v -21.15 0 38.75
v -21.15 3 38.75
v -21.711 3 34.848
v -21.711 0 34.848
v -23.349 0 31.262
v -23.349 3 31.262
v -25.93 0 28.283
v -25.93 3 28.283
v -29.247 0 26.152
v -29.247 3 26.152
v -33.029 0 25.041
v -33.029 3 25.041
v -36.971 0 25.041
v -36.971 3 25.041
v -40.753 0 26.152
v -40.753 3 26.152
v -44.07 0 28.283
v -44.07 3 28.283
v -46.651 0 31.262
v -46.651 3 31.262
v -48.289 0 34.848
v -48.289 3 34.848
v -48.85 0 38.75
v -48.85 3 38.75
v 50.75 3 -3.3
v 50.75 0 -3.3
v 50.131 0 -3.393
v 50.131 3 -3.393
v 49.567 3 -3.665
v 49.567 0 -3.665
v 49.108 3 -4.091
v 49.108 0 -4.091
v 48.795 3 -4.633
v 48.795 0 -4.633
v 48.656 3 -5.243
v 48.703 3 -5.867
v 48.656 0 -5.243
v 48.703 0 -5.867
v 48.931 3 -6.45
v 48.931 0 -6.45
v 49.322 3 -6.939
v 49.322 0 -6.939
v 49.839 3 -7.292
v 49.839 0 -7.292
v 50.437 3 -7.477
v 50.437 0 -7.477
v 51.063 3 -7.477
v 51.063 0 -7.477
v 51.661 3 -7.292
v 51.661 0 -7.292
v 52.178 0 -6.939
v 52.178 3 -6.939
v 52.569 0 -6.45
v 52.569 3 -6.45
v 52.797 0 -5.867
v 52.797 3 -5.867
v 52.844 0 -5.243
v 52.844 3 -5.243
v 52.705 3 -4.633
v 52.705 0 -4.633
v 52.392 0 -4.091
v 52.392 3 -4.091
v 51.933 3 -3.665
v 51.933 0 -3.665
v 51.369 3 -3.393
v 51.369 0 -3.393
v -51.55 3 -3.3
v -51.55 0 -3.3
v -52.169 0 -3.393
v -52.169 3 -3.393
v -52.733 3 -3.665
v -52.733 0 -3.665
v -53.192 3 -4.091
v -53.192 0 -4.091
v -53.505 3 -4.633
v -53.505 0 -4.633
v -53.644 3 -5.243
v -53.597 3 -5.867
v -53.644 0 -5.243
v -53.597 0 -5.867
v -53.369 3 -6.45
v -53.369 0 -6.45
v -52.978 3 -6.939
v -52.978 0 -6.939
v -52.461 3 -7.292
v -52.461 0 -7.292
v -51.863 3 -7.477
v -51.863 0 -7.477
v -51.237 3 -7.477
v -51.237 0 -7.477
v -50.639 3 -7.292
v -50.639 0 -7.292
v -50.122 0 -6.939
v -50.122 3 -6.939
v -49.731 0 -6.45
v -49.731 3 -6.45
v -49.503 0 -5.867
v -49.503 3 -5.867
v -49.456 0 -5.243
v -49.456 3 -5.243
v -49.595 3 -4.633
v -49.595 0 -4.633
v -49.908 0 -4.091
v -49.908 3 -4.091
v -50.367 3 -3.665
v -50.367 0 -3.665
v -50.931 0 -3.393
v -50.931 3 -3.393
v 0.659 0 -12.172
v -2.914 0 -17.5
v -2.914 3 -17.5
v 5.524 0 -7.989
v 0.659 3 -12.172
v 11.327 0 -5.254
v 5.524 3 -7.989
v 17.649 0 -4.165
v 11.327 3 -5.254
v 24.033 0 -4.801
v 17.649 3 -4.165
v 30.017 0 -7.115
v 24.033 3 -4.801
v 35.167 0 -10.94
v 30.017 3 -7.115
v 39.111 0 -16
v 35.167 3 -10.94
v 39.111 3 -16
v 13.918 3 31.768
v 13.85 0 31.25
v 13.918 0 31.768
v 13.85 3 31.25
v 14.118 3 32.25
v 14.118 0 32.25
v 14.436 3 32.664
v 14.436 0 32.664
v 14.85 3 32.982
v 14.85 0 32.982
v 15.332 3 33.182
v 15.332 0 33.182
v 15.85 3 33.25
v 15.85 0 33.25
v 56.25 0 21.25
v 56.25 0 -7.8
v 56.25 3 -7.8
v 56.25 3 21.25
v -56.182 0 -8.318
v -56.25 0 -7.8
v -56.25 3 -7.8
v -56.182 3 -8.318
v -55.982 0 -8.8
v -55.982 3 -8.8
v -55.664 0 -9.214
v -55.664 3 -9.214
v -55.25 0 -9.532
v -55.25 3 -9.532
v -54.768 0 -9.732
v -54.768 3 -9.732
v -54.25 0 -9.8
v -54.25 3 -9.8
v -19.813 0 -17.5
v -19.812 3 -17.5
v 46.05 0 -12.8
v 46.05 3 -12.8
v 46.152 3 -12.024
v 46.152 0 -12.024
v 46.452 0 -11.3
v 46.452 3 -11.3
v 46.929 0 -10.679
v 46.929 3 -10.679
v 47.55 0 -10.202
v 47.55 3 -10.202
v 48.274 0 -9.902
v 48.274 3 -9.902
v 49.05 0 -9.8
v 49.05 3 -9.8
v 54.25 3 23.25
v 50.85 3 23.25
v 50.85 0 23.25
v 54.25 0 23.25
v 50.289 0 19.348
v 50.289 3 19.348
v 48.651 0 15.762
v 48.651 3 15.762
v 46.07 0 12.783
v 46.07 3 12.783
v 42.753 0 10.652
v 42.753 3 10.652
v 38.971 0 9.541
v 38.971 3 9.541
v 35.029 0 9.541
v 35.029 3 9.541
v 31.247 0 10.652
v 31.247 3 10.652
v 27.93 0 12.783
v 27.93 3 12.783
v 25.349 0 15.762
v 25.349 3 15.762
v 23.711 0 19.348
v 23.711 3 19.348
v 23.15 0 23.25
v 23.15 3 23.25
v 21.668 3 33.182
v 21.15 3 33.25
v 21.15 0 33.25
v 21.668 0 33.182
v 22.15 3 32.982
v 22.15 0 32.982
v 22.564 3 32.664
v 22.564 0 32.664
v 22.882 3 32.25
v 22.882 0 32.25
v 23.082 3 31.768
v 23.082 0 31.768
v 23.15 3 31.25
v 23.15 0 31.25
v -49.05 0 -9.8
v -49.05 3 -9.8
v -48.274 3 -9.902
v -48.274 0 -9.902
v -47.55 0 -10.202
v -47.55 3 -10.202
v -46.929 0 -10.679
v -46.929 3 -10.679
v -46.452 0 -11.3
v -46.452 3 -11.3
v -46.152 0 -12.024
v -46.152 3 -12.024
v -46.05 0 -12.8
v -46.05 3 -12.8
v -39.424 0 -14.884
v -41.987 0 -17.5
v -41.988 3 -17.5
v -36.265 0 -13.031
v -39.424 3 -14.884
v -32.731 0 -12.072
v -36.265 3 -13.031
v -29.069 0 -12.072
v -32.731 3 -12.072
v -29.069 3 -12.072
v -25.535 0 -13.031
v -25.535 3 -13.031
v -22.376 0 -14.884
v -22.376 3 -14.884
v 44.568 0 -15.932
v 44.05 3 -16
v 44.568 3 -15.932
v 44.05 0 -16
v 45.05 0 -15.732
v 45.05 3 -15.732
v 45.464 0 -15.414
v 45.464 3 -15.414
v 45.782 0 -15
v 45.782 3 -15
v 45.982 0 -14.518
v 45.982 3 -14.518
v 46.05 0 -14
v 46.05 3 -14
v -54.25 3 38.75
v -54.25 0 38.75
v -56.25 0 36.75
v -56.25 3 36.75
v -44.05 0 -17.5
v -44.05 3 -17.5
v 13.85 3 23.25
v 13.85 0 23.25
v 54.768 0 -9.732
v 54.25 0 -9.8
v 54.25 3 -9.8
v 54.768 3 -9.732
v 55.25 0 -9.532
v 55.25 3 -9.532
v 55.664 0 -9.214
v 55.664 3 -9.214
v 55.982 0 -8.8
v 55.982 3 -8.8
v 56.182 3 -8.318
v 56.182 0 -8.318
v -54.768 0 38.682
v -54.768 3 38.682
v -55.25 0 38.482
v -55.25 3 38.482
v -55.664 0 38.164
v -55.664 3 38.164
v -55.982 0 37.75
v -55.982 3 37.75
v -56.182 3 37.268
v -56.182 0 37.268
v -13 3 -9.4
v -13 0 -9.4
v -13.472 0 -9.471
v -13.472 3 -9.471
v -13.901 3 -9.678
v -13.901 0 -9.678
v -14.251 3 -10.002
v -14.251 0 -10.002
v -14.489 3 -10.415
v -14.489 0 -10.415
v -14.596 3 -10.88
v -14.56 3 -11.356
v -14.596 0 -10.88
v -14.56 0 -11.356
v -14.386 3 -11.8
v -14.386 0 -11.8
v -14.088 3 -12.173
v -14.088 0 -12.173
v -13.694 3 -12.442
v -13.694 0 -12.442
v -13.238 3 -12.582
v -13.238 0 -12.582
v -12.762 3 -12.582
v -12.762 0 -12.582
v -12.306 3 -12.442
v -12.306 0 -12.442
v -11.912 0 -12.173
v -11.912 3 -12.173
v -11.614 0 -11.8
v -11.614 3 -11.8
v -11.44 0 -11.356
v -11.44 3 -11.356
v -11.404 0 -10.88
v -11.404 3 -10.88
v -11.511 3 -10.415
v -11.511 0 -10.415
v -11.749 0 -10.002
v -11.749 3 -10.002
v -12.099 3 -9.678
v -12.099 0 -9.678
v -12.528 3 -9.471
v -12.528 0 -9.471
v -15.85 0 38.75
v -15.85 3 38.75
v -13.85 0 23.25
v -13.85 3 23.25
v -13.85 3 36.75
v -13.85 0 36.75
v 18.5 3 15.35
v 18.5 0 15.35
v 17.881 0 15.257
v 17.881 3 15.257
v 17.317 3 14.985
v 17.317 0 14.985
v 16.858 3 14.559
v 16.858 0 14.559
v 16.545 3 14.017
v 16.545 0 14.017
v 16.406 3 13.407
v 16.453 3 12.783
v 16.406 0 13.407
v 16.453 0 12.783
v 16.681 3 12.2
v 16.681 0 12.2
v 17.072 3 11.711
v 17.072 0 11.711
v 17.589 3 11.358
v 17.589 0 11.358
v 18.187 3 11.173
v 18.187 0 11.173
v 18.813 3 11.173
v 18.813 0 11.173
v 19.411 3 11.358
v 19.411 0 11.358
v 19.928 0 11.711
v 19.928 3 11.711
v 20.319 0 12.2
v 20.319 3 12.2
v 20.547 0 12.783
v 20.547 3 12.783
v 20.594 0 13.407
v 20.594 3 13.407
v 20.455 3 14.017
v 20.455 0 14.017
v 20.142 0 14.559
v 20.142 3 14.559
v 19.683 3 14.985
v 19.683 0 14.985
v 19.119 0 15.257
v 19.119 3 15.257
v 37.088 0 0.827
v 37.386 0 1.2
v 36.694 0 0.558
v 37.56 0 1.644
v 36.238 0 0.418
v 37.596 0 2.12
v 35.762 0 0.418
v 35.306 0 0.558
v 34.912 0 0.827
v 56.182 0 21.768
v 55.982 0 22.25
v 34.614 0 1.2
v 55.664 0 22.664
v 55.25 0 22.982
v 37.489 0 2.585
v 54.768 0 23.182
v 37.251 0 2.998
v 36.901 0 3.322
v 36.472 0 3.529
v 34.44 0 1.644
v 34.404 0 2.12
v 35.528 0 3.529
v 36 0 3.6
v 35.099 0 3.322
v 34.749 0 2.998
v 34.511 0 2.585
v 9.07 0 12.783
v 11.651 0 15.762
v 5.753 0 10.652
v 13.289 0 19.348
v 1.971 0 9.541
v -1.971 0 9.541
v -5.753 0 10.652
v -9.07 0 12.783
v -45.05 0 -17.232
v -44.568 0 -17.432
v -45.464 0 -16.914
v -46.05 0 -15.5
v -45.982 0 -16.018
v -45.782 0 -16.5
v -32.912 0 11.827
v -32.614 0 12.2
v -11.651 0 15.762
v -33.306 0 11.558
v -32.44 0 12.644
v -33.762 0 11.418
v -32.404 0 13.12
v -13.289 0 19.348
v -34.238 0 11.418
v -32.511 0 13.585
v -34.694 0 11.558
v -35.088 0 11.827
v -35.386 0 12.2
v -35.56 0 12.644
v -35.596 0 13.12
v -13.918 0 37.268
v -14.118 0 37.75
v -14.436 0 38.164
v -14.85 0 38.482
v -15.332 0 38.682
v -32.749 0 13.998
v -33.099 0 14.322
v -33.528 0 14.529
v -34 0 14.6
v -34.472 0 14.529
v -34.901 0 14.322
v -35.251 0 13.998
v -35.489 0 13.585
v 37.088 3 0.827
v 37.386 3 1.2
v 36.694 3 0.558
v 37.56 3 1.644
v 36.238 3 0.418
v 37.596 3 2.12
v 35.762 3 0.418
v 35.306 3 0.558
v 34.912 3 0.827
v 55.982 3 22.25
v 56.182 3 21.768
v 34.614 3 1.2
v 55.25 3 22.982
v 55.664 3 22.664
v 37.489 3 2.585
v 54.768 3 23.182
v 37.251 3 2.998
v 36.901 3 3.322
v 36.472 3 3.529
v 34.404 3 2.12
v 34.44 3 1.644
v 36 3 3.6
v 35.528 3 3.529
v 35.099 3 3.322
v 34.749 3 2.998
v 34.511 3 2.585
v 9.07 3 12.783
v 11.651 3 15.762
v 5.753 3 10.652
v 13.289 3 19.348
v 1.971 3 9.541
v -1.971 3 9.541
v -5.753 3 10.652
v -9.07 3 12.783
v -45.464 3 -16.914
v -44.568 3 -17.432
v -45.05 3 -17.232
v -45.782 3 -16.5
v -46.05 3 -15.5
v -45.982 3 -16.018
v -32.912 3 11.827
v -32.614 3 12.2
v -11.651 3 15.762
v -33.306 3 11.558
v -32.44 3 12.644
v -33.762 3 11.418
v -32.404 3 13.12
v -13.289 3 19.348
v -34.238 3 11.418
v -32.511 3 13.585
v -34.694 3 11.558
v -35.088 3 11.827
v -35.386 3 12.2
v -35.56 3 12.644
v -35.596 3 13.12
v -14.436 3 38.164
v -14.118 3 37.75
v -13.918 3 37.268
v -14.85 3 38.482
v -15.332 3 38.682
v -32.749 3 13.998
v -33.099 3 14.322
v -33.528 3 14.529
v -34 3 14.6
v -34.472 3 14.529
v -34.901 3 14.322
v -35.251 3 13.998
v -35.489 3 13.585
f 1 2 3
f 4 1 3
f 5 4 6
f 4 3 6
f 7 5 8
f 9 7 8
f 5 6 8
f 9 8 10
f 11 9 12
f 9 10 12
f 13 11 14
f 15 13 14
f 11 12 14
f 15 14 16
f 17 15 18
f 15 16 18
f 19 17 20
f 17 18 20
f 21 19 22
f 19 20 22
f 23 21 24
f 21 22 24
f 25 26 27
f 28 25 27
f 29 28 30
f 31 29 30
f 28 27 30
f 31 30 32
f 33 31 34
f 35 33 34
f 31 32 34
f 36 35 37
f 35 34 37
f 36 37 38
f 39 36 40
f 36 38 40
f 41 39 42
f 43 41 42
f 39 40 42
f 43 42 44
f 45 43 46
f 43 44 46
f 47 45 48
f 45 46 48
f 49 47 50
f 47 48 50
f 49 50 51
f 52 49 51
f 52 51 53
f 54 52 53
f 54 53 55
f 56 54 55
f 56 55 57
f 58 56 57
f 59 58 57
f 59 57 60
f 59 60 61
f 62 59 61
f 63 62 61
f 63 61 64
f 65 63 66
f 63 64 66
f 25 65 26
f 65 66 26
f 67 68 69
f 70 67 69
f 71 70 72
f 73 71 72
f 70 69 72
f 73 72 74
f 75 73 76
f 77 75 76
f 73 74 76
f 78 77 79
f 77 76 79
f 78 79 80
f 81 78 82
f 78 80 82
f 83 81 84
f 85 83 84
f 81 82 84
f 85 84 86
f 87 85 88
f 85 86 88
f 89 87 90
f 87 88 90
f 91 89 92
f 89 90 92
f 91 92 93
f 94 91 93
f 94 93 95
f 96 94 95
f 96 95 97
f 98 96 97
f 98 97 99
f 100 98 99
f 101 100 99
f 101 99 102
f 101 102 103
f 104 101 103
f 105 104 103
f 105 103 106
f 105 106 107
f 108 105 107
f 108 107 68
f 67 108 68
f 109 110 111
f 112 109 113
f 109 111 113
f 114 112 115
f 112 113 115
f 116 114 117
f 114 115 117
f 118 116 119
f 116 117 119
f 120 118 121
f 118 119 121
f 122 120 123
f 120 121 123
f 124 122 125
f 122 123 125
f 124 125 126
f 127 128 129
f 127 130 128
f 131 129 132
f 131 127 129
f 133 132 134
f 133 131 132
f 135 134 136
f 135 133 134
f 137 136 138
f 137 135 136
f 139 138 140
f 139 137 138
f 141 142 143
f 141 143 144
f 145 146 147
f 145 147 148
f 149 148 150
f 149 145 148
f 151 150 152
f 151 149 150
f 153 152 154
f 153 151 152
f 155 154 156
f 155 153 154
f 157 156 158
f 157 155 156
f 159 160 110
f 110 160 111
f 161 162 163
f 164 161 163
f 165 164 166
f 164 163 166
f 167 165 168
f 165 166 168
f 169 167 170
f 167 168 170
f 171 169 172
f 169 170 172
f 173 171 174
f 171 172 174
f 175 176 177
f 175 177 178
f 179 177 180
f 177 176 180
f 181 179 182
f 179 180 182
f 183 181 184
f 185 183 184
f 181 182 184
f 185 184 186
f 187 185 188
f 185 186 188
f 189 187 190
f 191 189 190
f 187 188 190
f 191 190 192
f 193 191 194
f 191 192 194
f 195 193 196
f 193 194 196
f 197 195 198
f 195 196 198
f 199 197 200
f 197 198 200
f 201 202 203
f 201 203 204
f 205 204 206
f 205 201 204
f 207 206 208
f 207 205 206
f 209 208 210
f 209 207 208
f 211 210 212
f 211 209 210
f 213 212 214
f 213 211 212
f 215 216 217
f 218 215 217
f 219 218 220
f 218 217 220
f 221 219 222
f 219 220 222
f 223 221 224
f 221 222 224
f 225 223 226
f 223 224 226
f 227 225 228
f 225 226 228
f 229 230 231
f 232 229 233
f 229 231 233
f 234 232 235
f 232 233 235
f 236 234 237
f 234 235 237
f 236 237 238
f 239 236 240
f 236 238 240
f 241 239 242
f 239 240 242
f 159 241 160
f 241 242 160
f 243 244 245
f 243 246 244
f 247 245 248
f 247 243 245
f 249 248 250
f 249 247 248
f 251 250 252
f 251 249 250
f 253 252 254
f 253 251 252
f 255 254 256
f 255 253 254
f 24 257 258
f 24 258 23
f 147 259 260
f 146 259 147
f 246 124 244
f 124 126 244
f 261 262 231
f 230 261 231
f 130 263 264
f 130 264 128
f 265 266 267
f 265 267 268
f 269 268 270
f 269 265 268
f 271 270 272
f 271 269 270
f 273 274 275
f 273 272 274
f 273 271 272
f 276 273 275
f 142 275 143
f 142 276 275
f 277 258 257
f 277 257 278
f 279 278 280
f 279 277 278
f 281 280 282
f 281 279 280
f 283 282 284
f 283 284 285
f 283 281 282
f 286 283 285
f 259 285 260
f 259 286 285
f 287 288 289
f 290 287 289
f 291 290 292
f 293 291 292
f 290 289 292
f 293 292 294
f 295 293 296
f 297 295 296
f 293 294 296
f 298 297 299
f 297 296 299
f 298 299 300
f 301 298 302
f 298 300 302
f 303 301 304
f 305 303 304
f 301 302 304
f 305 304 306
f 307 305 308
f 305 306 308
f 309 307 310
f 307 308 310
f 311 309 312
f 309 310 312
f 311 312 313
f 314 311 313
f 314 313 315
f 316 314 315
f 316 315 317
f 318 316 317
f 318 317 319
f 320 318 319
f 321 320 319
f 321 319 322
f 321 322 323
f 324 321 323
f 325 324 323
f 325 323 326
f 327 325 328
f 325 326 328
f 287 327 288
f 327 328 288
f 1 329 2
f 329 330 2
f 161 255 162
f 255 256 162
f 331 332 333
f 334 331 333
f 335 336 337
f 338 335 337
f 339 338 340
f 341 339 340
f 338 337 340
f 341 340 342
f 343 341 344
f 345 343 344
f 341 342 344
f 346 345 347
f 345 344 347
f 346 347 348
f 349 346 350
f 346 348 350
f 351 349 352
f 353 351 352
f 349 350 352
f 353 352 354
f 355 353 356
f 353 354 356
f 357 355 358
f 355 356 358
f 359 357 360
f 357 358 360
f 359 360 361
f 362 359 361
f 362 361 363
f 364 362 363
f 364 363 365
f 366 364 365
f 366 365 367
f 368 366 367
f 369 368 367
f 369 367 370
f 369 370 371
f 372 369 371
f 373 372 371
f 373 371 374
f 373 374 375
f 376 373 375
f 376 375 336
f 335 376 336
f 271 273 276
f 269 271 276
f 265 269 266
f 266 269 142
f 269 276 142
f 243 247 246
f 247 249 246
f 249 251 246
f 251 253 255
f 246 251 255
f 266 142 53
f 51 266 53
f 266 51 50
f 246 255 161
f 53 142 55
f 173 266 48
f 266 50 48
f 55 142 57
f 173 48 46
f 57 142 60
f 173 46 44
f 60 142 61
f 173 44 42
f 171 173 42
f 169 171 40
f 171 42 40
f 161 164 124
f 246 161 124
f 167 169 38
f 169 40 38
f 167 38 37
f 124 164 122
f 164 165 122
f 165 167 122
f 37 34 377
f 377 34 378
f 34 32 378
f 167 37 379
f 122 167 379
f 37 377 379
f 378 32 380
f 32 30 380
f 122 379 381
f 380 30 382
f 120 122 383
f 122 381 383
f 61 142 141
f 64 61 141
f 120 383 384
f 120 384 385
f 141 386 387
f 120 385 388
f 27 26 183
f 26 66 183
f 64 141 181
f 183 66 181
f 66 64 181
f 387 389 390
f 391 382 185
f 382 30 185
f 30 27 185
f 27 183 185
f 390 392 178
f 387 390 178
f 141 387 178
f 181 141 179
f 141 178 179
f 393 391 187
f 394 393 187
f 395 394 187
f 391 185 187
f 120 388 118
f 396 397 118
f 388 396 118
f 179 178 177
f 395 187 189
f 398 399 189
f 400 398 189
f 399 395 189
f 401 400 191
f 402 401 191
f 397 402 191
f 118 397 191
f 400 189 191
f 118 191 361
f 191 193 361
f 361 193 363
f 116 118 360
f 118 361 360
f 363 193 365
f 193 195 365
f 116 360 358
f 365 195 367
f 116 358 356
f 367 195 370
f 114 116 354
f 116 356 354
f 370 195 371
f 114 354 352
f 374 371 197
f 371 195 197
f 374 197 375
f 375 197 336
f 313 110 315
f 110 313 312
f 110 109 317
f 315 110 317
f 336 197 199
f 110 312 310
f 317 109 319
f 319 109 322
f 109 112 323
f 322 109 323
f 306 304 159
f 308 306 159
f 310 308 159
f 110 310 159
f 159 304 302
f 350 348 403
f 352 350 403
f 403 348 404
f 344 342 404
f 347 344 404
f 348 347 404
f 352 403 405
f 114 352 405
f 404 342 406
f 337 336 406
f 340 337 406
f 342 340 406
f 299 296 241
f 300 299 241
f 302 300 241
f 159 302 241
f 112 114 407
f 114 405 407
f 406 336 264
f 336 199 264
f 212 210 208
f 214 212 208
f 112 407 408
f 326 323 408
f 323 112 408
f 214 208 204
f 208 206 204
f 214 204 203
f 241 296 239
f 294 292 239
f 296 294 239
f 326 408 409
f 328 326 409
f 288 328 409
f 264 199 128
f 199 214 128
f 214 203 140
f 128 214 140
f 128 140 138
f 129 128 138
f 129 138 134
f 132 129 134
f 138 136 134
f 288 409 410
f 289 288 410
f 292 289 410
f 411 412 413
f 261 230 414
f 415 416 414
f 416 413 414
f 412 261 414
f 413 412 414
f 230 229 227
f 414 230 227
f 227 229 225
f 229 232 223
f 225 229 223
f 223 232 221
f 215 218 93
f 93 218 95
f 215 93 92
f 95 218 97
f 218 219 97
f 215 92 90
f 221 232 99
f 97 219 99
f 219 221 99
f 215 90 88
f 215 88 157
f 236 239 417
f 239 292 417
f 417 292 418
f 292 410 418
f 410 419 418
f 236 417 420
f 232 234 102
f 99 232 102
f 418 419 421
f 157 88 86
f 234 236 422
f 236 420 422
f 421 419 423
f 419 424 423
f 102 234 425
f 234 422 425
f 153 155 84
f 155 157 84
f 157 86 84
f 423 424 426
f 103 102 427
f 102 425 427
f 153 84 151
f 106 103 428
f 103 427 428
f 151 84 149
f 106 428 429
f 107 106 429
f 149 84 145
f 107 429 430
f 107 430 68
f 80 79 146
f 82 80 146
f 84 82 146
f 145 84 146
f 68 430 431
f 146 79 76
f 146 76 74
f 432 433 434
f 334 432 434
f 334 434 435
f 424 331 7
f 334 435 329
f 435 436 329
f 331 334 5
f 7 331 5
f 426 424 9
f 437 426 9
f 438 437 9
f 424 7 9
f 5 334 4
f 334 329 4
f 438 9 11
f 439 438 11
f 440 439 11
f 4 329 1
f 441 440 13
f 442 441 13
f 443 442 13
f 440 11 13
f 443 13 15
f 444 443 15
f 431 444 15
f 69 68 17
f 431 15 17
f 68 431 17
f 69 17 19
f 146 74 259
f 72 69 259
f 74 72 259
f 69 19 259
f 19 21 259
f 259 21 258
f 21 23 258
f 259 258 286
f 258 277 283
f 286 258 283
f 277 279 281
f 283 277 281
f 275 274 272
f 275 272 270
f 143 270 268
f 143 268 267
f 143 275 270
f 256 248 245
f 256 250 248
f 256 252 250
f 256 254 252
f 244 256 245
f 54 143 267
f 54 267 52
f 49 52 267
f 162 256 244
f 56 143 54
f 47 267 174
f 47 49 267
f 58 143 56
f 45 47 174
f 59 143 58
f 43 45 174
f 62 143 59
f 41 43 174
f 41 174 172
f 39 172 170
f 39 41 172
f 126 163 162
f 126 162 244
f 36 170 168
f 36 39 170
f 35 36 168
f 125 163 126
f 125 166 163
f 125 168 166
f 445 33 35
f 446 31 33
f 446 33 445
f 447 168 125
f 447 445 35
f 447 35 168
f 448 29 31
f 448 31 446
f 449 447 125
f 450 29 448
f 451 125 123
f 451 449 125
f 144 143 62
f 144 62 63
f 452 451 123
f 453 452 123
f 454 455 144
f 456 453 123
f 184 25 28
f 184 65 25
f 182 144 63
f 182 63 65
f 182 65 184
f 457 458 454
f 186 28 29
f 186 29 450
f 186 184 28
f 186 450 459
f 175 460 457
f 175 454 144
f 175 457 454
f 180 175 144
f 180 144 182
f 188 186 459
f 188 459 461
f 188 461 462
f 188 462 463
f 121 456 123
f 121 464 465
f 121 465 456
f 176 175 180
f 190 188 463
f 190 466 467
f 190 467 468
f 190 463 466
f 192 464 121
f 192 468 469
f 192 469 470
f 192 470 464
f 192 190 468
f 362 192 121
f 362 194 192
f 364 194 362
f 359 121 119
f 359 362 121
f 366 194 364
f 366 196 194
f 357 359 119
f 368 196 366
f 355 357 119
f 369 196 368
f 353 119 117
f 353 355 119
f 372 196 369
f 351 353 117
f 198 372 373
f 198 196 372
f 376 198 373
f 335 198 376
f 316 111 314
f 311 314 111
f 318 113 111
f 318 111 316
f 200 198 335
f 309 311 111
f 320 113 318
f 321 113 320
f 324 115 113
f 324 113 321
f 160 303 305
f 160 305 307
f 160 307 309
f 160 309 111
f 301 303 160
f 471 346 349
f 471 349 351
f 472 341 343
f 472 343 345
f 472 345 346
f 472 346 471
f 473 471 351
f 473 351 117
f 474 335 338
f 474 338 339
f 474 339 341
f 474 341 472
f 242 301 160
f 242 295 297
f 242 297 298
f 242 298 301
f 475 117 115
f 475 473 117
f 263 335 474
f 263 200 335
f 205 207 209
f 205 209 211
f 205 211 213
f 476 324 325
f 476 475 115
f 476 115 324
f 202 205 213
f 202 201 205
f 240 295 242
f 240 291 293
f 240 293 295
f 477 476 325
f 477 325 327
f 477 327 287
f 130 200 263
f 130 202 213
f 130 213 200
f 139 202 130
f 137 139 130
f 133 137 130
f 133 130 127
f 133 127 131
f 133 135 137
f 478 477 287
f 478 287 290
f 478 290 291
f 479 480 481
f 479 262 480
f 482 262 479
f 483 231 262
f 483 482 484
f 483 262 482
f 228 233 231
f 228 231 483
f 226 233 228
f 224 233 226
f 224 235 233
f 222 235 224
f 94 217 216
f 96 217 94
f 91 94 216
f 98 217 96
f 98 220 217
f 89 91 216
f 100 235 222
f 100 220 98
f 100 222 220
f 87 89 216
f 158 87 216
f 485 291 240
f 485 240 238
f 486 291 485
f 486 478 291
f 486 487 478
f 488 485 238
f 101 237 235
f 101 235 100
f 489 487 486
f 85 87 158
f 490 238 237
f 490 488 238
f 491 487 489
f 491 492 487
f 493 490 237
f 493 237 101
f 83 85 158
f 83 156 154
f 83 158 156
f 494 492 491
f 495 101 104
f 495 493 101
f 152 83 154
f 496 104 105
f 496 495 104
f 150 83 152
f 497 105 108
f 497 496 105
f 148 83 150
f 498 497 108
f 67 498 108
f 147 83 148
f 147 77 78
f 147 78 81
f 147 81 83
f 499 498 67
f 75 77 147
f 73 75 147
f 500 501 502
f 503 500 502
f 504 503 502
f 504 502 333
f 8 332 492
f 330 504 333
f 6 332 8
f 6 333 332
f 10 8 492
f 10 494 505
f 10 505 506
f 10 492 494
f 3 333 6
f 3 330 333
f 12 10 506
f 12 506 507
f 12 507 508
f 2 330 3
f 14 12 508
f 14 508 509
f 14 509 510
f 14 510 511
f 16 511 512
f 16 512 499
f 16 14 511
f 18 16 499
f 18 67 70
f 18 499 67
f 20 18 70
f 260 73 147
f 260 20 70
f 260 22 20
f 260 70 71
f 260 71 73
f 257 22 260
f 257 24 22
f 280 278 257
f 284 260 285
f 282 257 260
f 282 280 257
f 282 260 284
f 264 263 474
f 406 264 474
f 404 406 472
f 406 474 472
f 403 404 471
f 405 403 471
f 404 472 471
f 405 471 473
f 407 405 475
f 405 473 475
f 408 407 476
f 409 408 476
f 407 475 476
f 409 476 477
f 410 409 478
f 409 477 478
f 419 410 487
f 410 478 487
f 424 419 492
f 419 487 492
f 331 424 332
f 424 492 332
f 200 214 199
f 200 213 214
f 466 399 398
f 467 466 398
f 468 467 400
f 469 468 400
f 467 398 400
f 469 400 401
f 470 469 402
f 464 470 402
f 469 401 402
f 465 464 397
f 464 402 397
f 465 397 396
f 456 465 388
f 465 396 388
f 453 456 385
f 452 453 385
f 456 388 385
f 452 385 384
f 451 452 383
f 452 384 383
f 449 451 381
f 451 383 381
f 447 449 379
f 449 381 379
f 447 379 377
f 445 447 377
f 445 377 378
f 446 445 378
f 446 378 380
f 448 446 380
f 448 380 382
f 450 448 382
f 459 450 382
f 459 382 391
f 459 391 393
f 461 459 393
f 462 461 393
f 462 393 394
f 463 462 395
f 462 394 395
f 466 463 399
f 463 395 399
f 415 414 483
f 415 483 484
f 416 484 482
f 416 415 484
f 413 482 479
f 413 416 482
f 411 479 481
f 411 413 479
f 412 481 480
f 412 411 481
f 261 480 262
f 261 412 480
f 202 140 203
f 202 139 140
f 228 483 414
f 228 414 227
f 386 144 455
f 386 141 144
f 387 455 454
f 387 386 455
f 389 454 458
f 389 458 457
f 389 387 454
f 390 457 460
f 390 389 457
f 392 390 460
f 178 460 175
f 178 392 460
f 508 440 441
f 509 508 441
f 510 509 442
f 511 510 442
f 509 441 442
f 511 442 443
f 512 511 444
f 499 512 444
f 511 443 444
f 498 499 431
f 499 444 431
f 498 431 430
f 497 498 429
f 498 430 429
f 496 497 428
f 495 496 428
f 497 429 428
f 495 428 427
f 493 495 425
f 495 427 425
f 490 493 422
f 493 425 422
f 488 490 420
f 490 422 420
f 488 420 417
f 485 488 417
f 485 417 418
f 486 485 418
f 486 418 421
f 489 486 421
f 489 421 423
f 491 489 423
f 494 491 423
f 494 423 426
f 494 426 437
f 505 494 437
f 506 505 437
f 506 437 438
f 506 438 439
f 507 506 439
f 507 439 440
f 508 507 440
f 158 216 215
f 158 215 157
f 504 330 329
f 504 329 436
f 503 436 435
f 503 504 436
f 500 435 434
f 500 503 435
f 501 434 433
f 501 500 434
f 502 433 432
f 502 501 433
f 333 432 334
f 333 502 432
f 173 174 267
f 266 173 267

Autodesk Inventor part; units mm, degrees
ref_plane "YZ Plane" through (0, 0, 0) normal (1, 0, 0) x (0, 1, 0)
ref_plane "XZ Plane" through (0, 0, 0) normal (0, 1, 0) x (-1, 0, 0)
ref_plane "XY Plane" through (0, 0, 0) normal (0, 0, 1) x (1, 0, 0)
sketch "Sketch1" plane through (0, 0, 0) normal (0, 1, 0) x (-1, 0, 0)
  line L0 (-56.25, 58.25) -> (56.25, 58.25)
  line L1 (56.25, 58.25) -> (56.25, -58.25)
  line L2 (56.25, -58.25) -> (-56.25, -58.25)
  line L3 (-56.25, -58.25) -> (-56.25, 58.25)
  line L4 (-56.25, 58.25) -> (56.25, -58.25) construction
  line L5 (56.25, 58.25) -> (-56.25, -58.25) construction
  point P0 (0, 0)
  dimension "d0" = 112.5
  dimension "d1" = 116.5
extrude "Extrusion1" add sketch "Sketch1" along normal blind 3
sketch "Sketch2" plane through (0, 3, 0) normal (0, 1, 0) x (1, 0, 0)
  circle A0 centre (18.5, 28) radius 23.85
  circle A1 centre (37, -23.25) radius 13.85
  circle A2 centre (-35, -38.75) radius 13.85
  circle A3 centre (-30.9, 25.8) radius 13.85
  circle A4 centre (0, -23.25) radius 13.85
  line L0 (56.25, 58.25) -> (-56.25, 58.25) projected
  line L1 (-56.25, -58.25) -> (56.25, -58.25) projected
  line L2 (0, -105.9299) -> (0, 123.2086) construction
  line L3 (-76.4777, -38.75) -> (-5.35, -38.75) construction
  line L4 (-123.5447, -23.25) -> (82.5572, -23.25) construction
  line L5 (56.25, -58.25) -> (56.25, 58.25) construction
  point P0 (0, 0)
  dimension "d4" = 47.7
  dimension "d5" = 27.7
  dimension "d6" = 27.7
  dimension "d7" = 27.7
  dimension "d8" = 27.7
  dimension "d9" = 116.5
  dimension "d10" = 112.5
  dimension "d13" = 37
  dimension "d14" = 18.5
  dimension "d15" = 30.9
  dimension "d18" = 19.5
  dimension "d19" = 35
  dimension "d20" = 35
  dimension "d57" = 25.8
  dimension "d58" = 28
  dimension "d59" = 23.25
extrude "Extrusion2" cut sketch "Sketch2" against normal blind 5
sketch "Sketch3" plane through (0, 3, 0) normal (0, 1, 0) x (1, 0, 0)
  line L0 (-56.25, 58.25) -> (-56.25, -58.25)
  line L1 (56.25, -58.25) -> (56.25, 58.25)
  line L2 (18.5, -17.4904) -> (18.5, -40.0394) construction
  line L3 (-51.55, 5.4) -> (-51.55, 71.9941) construction
  line L4 (50.75, 5.4) -> (50.75, 69.4565) construction
  line L5 (-73.722, 50) -> (66.5467, 50) construction
  line L6 (66.5467, 30) -> (-76.0779, 30) construction
  circle A0 centre (18.5, 28) radius 23.85 projected
  circle A1 centre (37, -23.25) radius 13.85 projected
  circle A2 centre (-30.9, 25.8) radius 13.85 projected
  circle A3 centre (0, -23.25) radius 13.85 projected
  circle A4 centre (-35, -38.75) radius 13.85 projected
  line L7 (56.25, 58.25) -> (-56.25, 58.25) projected
  line L8 (-56.25, 58.25) -> (-56.25, -58.25) projected
  line L9 (-56.25, -58.25) -> (56.25, -58.25) projected
  line L10 (56.25, -58.25) -> (56.25, 58.25) projected
  circle A5 centre (-30.9, 25.8) radius 13.85
  circle A6 centre (18.5, 28) radius 23.85
  circle A7 centre (0, -23.25) radius 13.85
  circle A8 centre (37, -23.25) radius 13.85
  circle A9 centre (-35, -38.75) radius 13.85
  line L11 (-56.25, 58.25) -> (-56.25, -58.25) projected
  line L12 (-56.25, 58.25) -> (-56.25, -58.25)
  line L13 (56.25, -58.25) -> (56.25, 58.25) projected
  line L14 (56.25, 58.25) -> (56.25, -58.25)
  line L15 (-56.25, 17.5) -> (-41.9875, 17.5)
  line L16 (-19.8125, 17.5) -> (-2.9143, 17.5)
  line L17 (39.1112, 16) -> (56.25, 16)
  line L18 (-56.25, -38.75) -> (-48.85, -38.75)
  circle A10 centre (-35, -38.75) radius 13.85 projected
  circle A11 centre (37, -23.25) radius 13.85 projected
  line L19 (50.85, -23.25) -> (56.25, -23.25)
  circle A12 centre (0, -23.25) radius 13.85 projected
  line L20 (-13.85, -23.25) -> (-13.85, -36.75)
  line L21 (-15.85, -38.75) -> (-21.15, -38.75)
  line L22 (13.85, -23.25) -> (13.85, -31.25)
  line L23 (15.85, -33.25) -> (21.15, -33.25)
  line L24 (23.15, -31.25) -> (23.15, -23.25)
  arc A13 (13.85, -31.25) -> (15.85, -33.25) centre (15.85, -31.25) ccw
  arc A14 (21.15, -33.25) -> (23.15, -31.25) centre (21.15, -31.25) ccw
  arc A15 (-15.85, -38.75) -> (-13.85, -36.75) centre (-15.85, -36.75) ccw
  point P0 (0, 0)
  point P1 (0, 0)
  point P2 (18.5, -13.25)
  point P3 (18.5, -23.25)
  point P4 (-51.55, 50)
  point P5 (-51.55, 30)
  point P6 (50.75, 50)
  point P7 (50.75, 30)
  point P8 (-13.85, -38.75)
  point P9 (13.85, -33.25)
  point P10 (-2.9143, 17.5)
  point P11 (-56.25, -38.75)
  dimension "d21" = 4.7
  dimension "d22" = 5.5
  dimension "d23" = 13.25
  dimension "d24" = 30
  dimension "d25" = 50
  dimension "d26" = 5.4
  dimension "d27" = 5.4
  dimension "d29" = 18.5
  dimension "d31" = 10
  dimension "d32" = 2
  dimension "d55" = 27.7
  dimension "d56" = 47.7
  dimension "d60" = 2
  dimension "d61" = 27.7
  dimension "d62" = 23.25
  dimension "d63" = 37
  dimension "d64" = 17.5
  dimension "d65" = 17.5
  dimension "d66" = 16
hole "Hole1" at (-51.55, 3, -5.4) at (50.75, 3, -5.4) at (18.5, 3, 13.25) at (-51.55, 3, -50) at (-51.55, 3, -30) at (50.75, 3, -50) at (50.75, 3, -30) direction (0, -1, 0) diameter 4.2 end through all
extrude "Extrusion3" cut sketch "Sketch3" against normal blind 10 contours L7 L1 L17 A0 L16 A2 L15 L0 | L18 A4 L21 A15 L20 A3 L22 A13 L23 A14 L24 A1 L19 L1 L9 L0 | A3
sketch "Sketch4" plane through (0, 3, 0) normal (0, 1, 0) x (1, 0, 0)
  line L0 (-50.25, 75.9498) -> (-50.25, -88.0061) construction
  line L1 (-63.9145, -52.25) -> (79.4097, -52.25) construction
  line L2 (50.25, 66.2924) -> (50.25, -77.9097) construction
  line L3 (-56.25, 58.25) -> (-56.25, -58.25) construction
  line L4 (-56.25, -58.25) -> (56.25, -58.25) construction
  line L5 (56.25, -58.25) -> (56.25, 58.25) construction
  line L6 (-71.816, 40) -> (84.2384, 40) construction
  line L7 (-70.7185, 14) -> (79.4097, 14) construction
  line L8 (-56.25, 17.5) -> (-56.25, -38.75) projected
  line L9 (-56.25, 17.5) -> (-46.05, 17.5)
  line L10 (-46.05, 17.5) -> (-46.05, 12.8)
  line L11 (-49.05, 9.8) -> (-56.25, 9.8)
  line L12 (-56.25, 9.8) -> (-56.25, 17.5)
  line L13 (56.25, -23.25) -> (56.25, 16) projected
  line L14 (56.25, 16) -> (46.05, 16)
  line L15 (46.05, 16) -> (46.05, 12.8)
  line L16 (49.05, 9.8) -> (56.25, 9.8)
  line L17 (56.25, 9.8) -> (56.25, 16)
  line L18 (56.25, -23.25) -> (56.25, 16) projected
  line L19 (-56.25, 17.5) -> (-56.25, -38.75) projected
  arc A0 (-49.05, 9.8) -> (-46.05, 12.8) centre (-49.05, 12.8) ccw
  arc A1 (46.05, 12.8) -> (49.05, 9.8) centre (49.05, 12.8) ccw
  point P0 (0, 0)
  point P1 (0, 0)
  point P2 (-50.25, 40)
  point P3 (-50.25, 14)
  point P4 (-50.25, -52.25)
  point P5 (50.25, -52.25)
  point P6 (0, -52.25)
  point P7 (50.25, 14)
  point P8 (50.25, 40)
  dimension "d42" = 6
  dimension "d43" = 6
  dimension "d44" = 6
  dimension "d45" = 14
  dimension "d46" = 40
  dimension "d47" = 4.2
  dimension "d48" = 14
  dimension "d49" = 4.2
  dimension "d50" = 4.2
  dimension "d52" = 3
extrude "Extrusion4" cut sketch "Sketch4" against normal blind 10
fillet "Fillet1" radius 2 4 edges at (-56.25, 1.5, 38.75) (56.25, 1.5, 23.25) (56.25, 1.5, -9.8) (-56.25, 1.5, -9.8)
sketch "Sketch5" plane through (0, 3, 0) normal (0, 1, 0) x (1, 0, 0)
  point P0 (0, 0)
  point P1 (0, 0)
  point P2 (-34, -13)
  point P3 (-13, 11)
  point P4 (36, -2)
  dimension "d68" = 13
  dimension "d69" = 34
  dimension "d70" = 36
  dimension "d71" = 2
  dimension "d72" = 11
  dimension "d73" = 13
hole "Hole2" at (-34, 3, 13) at (-13, 3, -11) at (36, 3, 2) direction (0, -1, 0) diameter 3.2 end through all
fillet "Fillet2" radius 2 2 edges at (-46.05, 1.5, -17.5) (46.05, 1.5, -16)
properties part number "Bottle clamping plate 2"
